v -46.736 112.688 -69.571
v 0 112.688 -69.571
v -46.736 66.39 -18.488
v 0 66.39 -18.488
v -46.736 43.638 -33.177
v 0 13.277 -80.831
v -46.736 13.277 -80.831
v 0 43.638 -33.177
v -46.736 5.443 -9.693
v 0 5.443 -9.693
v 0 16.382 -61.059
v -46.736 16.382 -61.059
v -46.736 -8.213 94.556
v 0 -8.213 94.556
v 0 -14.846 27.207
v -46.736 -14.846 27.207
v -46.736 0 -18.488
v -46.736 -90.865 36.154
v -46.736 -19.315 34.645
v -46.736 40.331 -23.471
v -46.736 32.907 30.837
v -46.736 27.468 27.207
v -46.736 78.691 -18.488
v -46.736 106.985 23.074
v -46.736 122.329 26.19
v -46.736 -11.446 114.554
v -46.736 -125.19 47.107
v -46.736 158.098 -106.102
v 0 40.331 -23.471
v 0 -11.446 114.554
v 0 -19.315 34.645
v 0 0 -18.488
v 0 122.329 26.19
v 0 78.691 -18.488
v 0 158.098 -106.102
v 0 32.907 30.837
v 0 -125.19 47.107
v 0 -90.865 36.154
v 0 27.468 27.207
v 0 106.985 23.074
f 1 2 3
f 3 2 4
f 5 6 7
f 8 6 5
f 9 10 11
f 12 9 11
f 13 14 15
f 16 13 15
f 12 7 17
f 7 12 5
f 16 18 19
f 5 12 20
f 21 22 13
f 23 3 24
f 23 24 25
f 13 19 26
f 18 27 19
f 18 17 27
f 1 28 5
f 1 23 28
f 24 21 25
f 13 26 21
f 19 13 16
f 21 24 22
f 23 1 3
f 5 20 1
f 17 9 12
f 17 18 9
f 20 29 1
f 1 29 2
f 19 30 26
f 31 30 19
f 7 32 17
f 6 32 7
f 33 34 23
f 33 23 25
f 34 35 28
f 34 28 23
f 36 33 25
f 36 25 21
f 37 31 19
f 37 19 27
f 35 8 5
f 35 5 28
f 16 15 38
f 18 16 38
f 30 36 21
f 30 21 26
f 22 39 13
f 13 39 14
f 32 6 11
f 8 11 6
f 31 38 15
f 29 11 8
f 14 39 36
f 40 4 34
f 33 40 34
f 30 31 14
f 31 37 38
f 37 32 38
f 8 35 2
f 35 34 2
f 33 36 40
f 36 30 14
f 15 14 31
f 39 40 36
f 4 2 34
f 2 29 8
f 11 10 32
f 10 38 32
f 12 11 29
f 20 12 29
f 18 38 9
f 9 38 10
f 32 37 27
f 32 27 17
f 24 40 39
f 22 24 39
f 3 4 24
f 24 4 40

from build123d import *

# Parameters (mm, degrees)
F1_DEPTH = 46.736
F3_DEPTH = 103.124


with BuildPart() as f1:
    # F0 (on Right) → F1 (new body)
    with BuildSketch(Plane.YZ):
        Polygon((-11.445979, 114.554122), (-19.315097, 34.645349), (-125.190452, 47.106925), (0, -18.487986), (13.276745, -80.830555), (43.63782, -33.176992), (158.097655, -106.101729), (78.691132, -18.487986), (122.328952, 26.189538), (32.907203, 30.837342), align=None)
    extrude(amount=-F1_DEPTH)

    # F2 (on face) → F3 (cut)
    with BuildSketch(Plane.YZ):
        Polygon((-14.845758, 27.206887), (-90.865381, 36.15443), (5.442825, -9.693216), (16.382012, -61.059497), (40.33051, -23.470866), (112.687898, -69.57126), (66.389852, -18.487986), (106.984551, 23.073913), (27.467924, 27.206887), (-8.213498, 94.555692), align=None)
    extrude(amount=-F3_DEPTH, mode=Mode.SUBTRACT)


solid = f1.part
